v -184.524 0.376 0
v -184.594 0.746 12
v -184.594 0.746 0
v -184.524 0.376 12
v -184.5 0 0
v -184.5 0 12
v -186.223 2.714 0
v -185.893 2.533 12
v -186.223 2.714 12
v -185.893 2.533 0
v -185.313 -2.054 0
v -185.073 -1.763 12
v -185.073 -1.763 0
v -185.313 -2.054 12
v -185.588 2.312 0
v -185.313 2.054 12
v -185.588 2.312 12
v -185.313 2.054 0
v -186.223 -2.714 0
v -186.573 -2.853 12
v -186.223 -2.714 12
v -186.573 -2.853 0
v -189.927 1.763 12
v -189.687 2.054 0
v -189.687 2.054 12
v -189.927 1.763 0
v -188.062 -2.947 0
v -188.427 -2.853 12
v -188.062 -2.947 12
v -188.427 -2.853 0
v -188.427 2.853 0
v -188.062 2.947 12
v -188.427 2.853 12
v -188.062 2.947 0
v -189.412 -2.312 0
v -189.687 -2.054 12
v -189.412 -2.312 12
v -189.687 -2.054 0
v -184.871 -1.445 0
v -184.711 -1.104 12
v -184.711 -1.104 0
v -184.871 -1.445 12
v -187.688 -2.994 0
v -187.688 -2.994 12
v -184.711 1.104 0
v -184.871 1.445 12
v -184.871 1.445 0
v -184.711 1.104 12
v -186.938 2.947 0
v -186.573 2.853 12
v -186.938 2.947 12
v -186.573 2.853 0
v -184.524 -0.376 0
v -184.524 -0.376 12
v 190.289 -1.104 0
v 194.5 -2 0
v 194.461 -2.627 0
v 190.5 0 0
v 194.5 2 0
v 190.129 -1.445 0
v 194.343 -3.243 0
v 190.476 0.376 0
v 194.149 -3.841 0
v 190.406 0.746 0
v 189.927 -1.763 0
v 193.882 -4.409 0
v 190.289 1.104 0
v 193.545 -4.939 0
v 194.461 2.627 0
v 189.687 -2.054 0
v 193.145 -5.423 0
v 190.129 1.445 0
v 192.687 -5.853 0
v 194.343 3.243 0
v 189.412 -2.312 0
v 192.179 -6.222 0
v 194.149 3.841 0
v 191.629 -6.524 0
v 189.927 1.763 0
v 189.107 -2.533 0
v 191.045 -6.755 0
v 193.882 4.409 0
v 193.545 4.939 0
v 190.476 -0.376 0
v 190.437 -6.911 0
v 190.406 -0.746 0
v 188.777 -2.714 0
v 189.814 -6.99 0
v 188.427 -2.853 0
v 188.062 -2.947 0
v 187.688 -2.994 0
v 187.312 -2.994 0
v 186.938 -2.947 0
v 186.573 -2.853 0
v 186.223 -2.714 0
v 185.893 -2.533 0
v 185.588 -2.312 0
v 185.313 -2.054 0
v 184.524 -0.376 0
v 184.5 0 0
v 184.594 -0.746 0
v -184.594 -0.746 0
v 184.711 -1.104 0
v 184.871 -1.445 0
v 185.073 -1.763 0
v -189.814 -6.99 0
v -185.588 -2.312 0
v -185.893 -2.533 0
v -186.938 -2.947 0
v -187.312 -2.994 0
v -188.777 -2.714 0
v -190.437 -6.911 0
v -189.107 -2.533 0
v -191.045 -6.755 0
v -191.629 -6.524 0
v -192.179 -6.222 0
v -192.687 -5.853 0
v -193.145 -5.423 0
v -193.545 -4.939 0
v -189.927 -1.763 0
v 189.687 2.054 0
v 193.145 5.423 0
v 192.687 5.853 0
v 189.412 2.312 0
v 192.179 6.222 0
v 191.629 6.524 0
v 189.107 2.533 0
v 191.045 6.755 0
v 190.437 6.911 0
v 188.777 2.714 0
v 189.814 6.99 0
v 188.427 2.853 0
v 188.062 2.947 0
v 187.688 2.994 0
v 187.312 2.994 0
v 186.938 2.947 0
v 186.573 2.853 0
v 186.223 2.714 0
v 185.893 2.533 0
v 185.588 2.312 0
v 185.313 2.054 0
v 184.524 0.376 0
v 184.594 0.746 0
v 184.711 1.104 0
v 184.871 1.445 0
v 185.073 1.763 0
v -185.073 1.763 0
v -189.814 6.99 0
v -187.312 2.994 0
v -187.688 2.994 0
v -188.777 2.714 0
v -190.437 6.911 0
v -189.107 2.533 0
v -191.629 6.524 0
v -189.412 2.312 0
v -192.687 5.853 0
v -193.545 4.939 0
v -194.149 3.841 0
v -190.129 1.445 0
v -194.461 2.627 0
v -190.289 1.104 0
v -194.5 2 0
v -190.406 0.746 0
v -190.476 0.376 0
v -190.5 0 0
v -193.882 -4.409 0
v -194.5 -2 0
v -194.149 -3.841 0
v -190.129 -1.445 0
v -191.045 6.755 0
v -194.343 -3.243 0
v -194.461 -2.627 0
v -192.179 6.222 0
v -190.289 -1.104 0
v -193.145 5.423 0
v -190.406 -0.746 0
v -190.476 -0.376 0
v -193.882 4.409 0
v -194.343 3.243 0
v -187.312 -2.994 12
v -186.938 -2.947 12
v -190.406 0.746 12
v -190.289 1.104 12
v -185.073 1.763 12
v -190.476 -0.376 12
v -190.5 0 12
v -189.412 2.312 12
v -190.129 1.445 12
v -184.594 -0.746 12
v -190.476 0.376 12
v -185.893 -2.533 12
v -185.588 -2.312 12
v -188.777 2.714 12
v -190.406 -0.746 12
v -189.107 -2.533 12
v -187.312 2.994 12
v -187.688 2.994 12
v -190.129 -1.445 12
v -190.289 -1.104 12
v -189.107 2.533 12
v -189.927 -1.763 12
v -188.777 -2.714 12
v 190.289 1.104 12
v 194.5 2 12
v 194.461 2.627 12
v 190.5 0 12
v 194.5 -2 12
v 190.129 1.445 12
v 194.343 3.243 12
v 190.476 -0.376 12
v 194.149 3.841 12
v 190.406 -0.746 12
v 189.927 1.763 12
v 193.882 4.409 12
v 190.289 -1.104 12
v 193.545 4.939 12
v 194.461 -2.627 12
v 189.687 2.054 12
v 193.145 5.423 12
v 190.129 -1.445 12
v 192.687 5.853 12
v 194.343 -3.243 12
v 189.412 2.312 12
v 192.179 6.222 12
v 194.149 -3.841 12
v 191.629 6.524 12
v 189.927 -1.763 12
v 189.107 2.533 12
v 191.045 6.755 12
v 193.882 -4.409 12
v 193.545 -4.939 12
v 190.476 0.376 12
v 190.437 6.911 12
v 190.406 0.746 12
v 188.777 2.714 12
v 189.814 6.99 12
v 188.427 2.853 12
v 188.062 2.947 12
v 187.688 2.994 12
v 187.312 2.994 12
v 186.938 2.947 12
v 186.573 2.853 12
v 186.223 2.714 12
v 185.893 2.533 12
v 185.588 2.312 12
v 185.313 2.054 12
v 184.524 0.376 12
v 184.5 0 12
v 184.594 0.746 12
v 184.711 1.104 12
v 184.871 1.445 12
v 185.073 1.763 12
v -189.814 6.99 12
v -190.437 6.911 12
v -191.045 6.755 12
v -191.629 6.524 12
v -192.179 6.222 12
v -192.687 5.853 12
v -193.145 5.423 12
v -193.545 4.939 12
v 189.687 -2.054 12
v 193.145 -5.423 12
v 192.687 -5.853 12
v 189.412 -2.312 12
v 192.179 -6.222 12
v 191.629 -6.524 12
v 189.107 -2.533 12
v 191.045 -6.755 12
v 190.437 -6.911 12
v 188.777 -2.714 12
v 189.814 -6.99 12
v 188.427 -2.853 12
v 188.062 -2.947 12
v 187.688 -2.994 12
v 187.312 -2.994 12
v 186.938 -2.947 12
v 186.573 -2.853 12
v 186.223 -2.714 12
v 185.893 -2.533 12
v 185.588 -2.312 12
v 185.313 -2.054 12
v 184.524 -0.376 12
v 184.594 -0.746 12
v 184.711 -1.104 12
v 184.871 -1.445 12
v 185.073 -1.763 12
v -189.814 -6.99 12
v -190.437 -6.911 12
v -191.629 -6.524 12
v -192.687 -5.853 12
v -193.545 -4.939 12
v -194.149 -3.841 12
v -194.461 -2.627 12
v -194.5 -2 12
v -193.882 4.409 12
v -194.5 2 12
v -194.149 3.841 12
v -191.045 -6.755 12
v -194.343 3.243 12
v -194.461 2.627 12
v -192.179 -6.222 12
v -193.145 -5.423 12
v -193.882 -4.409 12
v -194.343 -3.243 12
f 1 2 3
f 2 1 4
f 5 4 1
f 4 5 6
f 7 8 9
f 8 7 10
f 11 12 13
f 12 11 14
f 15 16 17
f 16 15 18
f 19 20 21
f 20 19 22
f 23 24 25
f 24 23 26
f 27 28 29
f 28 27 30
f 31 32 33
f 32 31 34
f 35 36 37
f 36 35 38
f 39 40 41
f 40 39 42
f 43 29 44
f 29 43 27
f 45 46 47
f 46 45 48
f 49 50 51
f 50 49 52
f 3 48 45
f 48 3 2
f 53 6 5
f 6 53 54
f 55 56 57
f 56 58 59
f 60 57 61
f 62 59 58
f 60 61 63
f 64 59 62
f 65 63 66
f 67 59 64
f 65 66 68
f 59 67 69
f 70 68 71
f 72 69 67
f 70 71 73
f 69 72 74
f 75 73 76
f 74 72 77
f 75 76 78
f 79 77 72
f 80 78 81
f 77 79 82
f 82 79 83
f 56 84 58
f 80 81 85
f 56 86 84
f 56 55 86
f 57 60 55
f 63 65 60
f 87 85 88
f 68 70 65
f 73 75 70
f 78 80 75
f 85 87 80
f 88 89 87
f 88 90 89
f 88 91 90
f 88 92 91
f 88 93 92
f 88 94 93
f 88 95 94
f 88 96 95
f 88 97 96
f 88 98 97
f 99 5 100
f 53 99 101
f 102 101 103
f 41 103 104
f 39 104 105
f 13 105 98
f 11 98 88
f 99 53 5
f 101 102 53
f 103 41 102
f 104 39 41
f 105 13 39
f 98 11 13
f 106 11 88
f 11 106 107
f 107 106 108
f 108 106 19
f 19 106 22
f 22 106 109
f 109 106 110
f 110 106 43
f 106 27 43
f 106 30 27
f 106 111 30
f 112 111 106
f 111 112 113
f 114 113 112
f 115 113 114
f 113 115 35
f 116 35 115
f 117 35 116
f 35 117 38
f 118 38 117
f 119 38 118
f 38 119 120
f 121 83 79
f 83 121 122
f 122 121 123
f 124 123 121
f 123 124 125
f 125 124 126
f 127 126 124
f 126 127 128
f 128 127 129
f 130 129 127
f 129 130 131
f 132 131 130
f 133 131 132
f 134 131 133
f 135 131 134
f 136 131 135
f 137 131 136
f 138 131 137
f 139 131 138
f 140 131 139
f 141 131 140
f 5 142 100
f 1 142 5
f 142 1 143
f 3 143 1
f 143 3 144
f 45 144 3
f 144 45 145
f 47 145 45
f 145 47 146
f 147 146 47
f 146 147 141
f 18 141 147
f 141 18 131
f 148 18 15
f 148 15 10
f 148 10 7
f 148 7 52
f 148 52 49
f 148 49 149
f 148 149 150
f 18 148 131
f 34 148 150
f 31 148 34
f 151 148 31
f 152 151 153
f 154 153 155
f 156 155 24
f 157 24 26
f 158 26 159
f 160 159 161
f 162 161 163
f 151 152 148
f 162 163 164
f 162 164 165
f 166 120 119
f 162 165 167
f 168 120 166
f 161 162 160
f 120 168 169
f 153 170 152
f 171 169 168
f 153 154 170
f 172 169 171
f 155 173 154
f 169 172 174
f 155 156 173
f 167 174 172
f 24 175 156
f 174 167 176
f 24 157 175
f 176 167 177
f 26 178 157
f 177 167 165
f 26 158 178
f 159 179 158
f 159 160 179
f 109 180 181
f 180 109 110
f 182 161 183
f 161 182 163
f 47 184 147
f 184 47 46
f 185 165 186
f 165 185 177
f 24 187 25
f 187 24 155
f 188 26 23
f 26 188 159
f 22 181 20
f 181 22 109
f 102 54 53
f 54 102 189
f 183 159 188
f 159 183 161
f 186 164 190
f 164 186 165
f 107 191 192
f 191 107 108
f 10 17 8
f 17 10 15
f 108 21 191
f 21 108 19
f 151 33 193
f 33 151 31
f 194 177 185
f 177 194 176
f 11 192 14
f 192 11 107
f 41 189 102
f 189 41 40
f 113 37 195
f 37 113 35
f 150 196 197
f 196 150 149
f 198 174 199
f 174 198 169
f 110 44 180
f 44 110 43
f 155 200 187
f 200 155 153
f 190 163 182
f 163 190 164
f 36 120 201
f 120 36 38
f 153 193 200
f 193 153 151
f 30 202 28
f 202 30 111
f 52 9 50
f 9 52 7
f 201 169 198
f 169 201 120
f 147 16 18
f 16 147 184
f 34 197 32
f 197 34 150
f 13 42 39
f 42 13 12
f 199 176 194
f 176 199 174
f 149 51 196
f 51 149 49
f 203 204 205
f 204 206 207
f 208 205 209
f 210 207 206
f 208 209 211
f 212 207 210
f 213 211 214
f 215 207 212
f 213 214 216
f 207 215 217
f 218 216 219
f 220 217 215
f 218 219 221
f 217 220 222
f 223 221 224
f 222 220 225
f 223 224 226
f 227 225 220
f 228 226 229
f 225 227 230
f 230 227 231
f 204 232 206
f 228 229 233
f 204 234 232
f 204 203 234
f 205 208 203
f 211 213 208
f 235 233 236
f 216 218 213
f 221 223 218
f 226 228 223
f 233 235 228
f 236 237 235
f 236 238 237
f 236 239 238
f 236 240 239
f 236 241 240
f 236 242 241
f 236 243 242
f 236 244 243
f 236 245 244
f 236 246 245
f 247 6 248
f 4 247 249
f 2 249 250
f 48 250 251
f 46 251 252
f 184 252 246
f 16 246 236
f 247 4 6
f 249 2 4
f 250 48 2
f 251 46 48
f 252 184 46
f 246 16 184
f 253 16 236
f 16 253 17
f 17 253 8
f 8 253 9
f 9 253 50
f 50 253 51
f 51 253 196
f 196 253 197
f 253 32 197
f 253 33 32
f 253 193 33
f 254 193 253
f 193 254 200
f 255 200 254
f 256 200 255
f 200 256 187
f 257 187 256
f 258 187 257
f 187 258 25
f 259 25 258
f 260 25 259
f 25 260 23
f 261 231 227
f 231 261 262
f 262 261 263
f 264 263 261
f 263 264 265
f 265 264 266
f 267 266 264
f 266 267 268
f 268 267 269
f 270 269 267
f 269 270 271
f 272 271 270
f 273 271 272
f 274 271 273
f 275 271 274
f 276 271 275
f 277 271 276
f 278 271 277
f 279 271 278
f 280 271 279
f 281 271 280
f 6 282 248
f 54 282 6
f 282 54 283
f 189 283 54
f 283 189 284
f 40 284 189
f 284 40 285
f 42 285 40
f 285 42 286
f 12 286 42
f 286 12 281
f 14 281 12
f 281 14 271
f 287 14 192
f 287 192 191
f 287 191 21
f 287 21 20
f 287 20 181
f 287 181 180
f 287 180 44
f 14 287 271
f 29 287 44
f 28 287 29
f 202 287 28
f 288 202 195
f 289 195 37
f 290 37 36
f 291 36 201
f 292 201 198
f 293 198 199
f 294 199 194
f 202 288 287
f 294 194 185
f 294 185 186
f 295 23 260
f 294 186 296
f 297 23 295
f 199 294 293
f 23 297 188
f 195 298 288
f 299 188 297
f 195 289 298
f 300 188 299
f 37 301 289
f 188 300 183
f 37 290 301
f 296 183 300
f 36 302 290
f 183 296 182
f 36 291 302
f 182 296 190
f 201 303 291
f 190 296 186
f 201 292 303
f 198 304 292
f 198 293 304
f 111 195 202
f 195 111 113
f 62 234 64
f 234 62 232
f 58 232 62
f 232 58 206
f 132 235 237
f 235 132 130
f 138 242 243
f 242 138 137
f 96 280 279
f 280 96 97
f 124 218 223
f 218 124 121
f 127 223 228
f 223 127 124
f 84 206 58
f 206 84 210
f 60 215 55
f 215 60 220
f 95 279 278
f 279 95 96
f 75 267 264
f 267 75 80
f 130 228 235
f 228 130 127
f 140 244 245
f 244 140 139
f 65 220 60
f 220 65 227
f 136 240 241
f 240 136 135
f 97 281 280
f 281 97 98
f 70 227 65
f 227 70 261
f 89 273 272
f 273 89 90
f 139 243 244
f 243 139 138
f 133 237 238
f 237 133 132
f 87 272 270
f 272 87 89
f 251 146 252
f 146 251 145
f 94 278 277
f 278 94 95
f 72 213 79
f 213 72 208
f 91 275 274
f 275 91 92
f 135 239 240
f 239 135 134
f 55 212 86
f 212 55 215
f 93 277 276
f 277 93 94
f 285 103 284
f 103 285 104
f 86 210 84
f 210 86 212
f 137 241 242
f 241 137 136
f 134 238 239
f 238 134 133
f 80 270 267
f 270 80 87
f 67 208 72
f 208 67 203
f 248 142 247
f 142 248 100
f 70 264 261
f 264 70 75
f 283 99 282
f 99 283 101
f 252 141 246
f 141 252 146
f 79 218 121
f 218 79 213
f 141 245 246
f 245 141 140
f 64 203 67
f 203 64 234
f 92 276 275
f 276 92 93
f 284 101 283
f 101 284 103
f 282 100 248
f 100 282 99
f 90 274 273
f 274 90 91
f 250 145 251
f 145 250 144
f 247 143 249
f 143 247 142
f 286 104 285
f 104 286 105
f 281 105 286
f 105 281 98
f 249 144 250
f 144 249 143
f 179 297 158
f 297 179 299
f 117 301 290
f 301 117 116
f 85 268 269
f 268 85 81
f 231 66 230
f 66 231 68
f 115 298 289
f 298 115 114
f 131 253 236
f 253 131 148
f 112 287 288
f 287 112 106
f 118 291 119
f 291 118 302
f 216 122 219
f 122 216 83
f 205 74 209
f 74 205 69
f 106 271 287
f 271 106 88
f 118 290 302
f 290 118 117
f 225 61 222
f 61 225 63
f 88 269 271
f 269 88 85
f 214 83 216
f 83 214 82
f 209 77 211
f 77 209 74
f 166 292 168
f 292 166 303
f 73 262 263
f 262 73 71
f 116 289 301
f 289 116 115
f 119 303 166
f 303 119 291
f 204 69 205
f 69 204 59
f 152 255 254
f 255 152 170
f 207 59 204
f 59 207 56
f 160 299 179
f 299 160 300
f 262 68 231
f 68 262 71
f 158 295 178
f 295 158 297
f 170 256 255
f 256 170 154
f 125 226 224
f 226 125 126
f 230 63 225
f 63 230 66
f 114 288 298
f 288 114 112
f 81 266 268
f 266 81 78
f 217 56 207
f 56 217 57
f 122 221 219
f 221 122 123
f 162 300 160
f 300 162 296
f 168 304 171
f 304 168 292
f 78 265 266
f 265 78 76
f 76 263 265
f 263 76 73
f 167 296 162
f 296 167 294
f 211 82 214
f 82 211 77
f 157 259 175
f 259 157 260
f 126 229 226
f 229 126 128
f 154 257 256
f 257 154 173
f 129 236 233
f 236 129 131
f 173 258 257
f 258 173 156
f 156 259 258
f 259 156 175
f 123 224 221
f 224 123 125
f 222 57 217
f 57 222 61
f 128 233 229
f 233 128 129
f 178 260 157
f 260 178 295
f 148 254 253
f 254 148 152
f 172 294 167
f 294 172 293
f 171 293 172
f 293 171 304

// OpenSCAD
$fn = 50;


difference() {
	union() {
		hull() {
			translate(v = [-189.5000000000, 2.0000000000, 0]) {
				cylinder(h = 12, r = 5);
			}
			translate(v = [189.5000000000, 2.0000000000, 0]) {
				cylinder(h = 12, r = 5);
			}
			translate(v = [-189.5000000000, -2.0000000000, 0]) {
				cylinder(h = 12, r = 5);
			}
			translate(v = [189.5000000000, -2.0000000000, 0]) {
				cylinder(h = 12, r = 5);
			}
		}
	}
	union() {
		translate(v = [-187.5000000000, 0.0000000000, 0]) {
			cylinder(h = 12, r = 3.0000000000);
		}
		translate(v = [187.5000000000, 0.0000000000, 0]) {
			cylinder(h = 12, r = 3.0000000000);
		}
		translate(v = [-187.5000000000, 0.0000000000, 0]) {
			cylinder(h = 12, r = 1.5000000000);
		}
		translate(v = [187.5000000000, 0.0000000000, 0]) {
			cylinder(h = 12, r = 1.5000000000);
		}
		translate(v = [-187.5000000000, 0.0000000000, 0]) {
			cylinder(h = 12, r = 1.5000000000);
		}
		translate(v = [187.5000000000, 0.0000000000, 0]) {
			cylinder(h = 12, r = 1.5000000000);
		}
		translate(v = [-187.5000000000, 0.0000000000, 0]) {
			cylinder(h = 12, r = 1.5000000000);
		}
		translate(v = [187.5000000000, 0.0000000000, 0]) {
			cylinder(h = 12, r = 1.5000000000);
		}
	}
}
